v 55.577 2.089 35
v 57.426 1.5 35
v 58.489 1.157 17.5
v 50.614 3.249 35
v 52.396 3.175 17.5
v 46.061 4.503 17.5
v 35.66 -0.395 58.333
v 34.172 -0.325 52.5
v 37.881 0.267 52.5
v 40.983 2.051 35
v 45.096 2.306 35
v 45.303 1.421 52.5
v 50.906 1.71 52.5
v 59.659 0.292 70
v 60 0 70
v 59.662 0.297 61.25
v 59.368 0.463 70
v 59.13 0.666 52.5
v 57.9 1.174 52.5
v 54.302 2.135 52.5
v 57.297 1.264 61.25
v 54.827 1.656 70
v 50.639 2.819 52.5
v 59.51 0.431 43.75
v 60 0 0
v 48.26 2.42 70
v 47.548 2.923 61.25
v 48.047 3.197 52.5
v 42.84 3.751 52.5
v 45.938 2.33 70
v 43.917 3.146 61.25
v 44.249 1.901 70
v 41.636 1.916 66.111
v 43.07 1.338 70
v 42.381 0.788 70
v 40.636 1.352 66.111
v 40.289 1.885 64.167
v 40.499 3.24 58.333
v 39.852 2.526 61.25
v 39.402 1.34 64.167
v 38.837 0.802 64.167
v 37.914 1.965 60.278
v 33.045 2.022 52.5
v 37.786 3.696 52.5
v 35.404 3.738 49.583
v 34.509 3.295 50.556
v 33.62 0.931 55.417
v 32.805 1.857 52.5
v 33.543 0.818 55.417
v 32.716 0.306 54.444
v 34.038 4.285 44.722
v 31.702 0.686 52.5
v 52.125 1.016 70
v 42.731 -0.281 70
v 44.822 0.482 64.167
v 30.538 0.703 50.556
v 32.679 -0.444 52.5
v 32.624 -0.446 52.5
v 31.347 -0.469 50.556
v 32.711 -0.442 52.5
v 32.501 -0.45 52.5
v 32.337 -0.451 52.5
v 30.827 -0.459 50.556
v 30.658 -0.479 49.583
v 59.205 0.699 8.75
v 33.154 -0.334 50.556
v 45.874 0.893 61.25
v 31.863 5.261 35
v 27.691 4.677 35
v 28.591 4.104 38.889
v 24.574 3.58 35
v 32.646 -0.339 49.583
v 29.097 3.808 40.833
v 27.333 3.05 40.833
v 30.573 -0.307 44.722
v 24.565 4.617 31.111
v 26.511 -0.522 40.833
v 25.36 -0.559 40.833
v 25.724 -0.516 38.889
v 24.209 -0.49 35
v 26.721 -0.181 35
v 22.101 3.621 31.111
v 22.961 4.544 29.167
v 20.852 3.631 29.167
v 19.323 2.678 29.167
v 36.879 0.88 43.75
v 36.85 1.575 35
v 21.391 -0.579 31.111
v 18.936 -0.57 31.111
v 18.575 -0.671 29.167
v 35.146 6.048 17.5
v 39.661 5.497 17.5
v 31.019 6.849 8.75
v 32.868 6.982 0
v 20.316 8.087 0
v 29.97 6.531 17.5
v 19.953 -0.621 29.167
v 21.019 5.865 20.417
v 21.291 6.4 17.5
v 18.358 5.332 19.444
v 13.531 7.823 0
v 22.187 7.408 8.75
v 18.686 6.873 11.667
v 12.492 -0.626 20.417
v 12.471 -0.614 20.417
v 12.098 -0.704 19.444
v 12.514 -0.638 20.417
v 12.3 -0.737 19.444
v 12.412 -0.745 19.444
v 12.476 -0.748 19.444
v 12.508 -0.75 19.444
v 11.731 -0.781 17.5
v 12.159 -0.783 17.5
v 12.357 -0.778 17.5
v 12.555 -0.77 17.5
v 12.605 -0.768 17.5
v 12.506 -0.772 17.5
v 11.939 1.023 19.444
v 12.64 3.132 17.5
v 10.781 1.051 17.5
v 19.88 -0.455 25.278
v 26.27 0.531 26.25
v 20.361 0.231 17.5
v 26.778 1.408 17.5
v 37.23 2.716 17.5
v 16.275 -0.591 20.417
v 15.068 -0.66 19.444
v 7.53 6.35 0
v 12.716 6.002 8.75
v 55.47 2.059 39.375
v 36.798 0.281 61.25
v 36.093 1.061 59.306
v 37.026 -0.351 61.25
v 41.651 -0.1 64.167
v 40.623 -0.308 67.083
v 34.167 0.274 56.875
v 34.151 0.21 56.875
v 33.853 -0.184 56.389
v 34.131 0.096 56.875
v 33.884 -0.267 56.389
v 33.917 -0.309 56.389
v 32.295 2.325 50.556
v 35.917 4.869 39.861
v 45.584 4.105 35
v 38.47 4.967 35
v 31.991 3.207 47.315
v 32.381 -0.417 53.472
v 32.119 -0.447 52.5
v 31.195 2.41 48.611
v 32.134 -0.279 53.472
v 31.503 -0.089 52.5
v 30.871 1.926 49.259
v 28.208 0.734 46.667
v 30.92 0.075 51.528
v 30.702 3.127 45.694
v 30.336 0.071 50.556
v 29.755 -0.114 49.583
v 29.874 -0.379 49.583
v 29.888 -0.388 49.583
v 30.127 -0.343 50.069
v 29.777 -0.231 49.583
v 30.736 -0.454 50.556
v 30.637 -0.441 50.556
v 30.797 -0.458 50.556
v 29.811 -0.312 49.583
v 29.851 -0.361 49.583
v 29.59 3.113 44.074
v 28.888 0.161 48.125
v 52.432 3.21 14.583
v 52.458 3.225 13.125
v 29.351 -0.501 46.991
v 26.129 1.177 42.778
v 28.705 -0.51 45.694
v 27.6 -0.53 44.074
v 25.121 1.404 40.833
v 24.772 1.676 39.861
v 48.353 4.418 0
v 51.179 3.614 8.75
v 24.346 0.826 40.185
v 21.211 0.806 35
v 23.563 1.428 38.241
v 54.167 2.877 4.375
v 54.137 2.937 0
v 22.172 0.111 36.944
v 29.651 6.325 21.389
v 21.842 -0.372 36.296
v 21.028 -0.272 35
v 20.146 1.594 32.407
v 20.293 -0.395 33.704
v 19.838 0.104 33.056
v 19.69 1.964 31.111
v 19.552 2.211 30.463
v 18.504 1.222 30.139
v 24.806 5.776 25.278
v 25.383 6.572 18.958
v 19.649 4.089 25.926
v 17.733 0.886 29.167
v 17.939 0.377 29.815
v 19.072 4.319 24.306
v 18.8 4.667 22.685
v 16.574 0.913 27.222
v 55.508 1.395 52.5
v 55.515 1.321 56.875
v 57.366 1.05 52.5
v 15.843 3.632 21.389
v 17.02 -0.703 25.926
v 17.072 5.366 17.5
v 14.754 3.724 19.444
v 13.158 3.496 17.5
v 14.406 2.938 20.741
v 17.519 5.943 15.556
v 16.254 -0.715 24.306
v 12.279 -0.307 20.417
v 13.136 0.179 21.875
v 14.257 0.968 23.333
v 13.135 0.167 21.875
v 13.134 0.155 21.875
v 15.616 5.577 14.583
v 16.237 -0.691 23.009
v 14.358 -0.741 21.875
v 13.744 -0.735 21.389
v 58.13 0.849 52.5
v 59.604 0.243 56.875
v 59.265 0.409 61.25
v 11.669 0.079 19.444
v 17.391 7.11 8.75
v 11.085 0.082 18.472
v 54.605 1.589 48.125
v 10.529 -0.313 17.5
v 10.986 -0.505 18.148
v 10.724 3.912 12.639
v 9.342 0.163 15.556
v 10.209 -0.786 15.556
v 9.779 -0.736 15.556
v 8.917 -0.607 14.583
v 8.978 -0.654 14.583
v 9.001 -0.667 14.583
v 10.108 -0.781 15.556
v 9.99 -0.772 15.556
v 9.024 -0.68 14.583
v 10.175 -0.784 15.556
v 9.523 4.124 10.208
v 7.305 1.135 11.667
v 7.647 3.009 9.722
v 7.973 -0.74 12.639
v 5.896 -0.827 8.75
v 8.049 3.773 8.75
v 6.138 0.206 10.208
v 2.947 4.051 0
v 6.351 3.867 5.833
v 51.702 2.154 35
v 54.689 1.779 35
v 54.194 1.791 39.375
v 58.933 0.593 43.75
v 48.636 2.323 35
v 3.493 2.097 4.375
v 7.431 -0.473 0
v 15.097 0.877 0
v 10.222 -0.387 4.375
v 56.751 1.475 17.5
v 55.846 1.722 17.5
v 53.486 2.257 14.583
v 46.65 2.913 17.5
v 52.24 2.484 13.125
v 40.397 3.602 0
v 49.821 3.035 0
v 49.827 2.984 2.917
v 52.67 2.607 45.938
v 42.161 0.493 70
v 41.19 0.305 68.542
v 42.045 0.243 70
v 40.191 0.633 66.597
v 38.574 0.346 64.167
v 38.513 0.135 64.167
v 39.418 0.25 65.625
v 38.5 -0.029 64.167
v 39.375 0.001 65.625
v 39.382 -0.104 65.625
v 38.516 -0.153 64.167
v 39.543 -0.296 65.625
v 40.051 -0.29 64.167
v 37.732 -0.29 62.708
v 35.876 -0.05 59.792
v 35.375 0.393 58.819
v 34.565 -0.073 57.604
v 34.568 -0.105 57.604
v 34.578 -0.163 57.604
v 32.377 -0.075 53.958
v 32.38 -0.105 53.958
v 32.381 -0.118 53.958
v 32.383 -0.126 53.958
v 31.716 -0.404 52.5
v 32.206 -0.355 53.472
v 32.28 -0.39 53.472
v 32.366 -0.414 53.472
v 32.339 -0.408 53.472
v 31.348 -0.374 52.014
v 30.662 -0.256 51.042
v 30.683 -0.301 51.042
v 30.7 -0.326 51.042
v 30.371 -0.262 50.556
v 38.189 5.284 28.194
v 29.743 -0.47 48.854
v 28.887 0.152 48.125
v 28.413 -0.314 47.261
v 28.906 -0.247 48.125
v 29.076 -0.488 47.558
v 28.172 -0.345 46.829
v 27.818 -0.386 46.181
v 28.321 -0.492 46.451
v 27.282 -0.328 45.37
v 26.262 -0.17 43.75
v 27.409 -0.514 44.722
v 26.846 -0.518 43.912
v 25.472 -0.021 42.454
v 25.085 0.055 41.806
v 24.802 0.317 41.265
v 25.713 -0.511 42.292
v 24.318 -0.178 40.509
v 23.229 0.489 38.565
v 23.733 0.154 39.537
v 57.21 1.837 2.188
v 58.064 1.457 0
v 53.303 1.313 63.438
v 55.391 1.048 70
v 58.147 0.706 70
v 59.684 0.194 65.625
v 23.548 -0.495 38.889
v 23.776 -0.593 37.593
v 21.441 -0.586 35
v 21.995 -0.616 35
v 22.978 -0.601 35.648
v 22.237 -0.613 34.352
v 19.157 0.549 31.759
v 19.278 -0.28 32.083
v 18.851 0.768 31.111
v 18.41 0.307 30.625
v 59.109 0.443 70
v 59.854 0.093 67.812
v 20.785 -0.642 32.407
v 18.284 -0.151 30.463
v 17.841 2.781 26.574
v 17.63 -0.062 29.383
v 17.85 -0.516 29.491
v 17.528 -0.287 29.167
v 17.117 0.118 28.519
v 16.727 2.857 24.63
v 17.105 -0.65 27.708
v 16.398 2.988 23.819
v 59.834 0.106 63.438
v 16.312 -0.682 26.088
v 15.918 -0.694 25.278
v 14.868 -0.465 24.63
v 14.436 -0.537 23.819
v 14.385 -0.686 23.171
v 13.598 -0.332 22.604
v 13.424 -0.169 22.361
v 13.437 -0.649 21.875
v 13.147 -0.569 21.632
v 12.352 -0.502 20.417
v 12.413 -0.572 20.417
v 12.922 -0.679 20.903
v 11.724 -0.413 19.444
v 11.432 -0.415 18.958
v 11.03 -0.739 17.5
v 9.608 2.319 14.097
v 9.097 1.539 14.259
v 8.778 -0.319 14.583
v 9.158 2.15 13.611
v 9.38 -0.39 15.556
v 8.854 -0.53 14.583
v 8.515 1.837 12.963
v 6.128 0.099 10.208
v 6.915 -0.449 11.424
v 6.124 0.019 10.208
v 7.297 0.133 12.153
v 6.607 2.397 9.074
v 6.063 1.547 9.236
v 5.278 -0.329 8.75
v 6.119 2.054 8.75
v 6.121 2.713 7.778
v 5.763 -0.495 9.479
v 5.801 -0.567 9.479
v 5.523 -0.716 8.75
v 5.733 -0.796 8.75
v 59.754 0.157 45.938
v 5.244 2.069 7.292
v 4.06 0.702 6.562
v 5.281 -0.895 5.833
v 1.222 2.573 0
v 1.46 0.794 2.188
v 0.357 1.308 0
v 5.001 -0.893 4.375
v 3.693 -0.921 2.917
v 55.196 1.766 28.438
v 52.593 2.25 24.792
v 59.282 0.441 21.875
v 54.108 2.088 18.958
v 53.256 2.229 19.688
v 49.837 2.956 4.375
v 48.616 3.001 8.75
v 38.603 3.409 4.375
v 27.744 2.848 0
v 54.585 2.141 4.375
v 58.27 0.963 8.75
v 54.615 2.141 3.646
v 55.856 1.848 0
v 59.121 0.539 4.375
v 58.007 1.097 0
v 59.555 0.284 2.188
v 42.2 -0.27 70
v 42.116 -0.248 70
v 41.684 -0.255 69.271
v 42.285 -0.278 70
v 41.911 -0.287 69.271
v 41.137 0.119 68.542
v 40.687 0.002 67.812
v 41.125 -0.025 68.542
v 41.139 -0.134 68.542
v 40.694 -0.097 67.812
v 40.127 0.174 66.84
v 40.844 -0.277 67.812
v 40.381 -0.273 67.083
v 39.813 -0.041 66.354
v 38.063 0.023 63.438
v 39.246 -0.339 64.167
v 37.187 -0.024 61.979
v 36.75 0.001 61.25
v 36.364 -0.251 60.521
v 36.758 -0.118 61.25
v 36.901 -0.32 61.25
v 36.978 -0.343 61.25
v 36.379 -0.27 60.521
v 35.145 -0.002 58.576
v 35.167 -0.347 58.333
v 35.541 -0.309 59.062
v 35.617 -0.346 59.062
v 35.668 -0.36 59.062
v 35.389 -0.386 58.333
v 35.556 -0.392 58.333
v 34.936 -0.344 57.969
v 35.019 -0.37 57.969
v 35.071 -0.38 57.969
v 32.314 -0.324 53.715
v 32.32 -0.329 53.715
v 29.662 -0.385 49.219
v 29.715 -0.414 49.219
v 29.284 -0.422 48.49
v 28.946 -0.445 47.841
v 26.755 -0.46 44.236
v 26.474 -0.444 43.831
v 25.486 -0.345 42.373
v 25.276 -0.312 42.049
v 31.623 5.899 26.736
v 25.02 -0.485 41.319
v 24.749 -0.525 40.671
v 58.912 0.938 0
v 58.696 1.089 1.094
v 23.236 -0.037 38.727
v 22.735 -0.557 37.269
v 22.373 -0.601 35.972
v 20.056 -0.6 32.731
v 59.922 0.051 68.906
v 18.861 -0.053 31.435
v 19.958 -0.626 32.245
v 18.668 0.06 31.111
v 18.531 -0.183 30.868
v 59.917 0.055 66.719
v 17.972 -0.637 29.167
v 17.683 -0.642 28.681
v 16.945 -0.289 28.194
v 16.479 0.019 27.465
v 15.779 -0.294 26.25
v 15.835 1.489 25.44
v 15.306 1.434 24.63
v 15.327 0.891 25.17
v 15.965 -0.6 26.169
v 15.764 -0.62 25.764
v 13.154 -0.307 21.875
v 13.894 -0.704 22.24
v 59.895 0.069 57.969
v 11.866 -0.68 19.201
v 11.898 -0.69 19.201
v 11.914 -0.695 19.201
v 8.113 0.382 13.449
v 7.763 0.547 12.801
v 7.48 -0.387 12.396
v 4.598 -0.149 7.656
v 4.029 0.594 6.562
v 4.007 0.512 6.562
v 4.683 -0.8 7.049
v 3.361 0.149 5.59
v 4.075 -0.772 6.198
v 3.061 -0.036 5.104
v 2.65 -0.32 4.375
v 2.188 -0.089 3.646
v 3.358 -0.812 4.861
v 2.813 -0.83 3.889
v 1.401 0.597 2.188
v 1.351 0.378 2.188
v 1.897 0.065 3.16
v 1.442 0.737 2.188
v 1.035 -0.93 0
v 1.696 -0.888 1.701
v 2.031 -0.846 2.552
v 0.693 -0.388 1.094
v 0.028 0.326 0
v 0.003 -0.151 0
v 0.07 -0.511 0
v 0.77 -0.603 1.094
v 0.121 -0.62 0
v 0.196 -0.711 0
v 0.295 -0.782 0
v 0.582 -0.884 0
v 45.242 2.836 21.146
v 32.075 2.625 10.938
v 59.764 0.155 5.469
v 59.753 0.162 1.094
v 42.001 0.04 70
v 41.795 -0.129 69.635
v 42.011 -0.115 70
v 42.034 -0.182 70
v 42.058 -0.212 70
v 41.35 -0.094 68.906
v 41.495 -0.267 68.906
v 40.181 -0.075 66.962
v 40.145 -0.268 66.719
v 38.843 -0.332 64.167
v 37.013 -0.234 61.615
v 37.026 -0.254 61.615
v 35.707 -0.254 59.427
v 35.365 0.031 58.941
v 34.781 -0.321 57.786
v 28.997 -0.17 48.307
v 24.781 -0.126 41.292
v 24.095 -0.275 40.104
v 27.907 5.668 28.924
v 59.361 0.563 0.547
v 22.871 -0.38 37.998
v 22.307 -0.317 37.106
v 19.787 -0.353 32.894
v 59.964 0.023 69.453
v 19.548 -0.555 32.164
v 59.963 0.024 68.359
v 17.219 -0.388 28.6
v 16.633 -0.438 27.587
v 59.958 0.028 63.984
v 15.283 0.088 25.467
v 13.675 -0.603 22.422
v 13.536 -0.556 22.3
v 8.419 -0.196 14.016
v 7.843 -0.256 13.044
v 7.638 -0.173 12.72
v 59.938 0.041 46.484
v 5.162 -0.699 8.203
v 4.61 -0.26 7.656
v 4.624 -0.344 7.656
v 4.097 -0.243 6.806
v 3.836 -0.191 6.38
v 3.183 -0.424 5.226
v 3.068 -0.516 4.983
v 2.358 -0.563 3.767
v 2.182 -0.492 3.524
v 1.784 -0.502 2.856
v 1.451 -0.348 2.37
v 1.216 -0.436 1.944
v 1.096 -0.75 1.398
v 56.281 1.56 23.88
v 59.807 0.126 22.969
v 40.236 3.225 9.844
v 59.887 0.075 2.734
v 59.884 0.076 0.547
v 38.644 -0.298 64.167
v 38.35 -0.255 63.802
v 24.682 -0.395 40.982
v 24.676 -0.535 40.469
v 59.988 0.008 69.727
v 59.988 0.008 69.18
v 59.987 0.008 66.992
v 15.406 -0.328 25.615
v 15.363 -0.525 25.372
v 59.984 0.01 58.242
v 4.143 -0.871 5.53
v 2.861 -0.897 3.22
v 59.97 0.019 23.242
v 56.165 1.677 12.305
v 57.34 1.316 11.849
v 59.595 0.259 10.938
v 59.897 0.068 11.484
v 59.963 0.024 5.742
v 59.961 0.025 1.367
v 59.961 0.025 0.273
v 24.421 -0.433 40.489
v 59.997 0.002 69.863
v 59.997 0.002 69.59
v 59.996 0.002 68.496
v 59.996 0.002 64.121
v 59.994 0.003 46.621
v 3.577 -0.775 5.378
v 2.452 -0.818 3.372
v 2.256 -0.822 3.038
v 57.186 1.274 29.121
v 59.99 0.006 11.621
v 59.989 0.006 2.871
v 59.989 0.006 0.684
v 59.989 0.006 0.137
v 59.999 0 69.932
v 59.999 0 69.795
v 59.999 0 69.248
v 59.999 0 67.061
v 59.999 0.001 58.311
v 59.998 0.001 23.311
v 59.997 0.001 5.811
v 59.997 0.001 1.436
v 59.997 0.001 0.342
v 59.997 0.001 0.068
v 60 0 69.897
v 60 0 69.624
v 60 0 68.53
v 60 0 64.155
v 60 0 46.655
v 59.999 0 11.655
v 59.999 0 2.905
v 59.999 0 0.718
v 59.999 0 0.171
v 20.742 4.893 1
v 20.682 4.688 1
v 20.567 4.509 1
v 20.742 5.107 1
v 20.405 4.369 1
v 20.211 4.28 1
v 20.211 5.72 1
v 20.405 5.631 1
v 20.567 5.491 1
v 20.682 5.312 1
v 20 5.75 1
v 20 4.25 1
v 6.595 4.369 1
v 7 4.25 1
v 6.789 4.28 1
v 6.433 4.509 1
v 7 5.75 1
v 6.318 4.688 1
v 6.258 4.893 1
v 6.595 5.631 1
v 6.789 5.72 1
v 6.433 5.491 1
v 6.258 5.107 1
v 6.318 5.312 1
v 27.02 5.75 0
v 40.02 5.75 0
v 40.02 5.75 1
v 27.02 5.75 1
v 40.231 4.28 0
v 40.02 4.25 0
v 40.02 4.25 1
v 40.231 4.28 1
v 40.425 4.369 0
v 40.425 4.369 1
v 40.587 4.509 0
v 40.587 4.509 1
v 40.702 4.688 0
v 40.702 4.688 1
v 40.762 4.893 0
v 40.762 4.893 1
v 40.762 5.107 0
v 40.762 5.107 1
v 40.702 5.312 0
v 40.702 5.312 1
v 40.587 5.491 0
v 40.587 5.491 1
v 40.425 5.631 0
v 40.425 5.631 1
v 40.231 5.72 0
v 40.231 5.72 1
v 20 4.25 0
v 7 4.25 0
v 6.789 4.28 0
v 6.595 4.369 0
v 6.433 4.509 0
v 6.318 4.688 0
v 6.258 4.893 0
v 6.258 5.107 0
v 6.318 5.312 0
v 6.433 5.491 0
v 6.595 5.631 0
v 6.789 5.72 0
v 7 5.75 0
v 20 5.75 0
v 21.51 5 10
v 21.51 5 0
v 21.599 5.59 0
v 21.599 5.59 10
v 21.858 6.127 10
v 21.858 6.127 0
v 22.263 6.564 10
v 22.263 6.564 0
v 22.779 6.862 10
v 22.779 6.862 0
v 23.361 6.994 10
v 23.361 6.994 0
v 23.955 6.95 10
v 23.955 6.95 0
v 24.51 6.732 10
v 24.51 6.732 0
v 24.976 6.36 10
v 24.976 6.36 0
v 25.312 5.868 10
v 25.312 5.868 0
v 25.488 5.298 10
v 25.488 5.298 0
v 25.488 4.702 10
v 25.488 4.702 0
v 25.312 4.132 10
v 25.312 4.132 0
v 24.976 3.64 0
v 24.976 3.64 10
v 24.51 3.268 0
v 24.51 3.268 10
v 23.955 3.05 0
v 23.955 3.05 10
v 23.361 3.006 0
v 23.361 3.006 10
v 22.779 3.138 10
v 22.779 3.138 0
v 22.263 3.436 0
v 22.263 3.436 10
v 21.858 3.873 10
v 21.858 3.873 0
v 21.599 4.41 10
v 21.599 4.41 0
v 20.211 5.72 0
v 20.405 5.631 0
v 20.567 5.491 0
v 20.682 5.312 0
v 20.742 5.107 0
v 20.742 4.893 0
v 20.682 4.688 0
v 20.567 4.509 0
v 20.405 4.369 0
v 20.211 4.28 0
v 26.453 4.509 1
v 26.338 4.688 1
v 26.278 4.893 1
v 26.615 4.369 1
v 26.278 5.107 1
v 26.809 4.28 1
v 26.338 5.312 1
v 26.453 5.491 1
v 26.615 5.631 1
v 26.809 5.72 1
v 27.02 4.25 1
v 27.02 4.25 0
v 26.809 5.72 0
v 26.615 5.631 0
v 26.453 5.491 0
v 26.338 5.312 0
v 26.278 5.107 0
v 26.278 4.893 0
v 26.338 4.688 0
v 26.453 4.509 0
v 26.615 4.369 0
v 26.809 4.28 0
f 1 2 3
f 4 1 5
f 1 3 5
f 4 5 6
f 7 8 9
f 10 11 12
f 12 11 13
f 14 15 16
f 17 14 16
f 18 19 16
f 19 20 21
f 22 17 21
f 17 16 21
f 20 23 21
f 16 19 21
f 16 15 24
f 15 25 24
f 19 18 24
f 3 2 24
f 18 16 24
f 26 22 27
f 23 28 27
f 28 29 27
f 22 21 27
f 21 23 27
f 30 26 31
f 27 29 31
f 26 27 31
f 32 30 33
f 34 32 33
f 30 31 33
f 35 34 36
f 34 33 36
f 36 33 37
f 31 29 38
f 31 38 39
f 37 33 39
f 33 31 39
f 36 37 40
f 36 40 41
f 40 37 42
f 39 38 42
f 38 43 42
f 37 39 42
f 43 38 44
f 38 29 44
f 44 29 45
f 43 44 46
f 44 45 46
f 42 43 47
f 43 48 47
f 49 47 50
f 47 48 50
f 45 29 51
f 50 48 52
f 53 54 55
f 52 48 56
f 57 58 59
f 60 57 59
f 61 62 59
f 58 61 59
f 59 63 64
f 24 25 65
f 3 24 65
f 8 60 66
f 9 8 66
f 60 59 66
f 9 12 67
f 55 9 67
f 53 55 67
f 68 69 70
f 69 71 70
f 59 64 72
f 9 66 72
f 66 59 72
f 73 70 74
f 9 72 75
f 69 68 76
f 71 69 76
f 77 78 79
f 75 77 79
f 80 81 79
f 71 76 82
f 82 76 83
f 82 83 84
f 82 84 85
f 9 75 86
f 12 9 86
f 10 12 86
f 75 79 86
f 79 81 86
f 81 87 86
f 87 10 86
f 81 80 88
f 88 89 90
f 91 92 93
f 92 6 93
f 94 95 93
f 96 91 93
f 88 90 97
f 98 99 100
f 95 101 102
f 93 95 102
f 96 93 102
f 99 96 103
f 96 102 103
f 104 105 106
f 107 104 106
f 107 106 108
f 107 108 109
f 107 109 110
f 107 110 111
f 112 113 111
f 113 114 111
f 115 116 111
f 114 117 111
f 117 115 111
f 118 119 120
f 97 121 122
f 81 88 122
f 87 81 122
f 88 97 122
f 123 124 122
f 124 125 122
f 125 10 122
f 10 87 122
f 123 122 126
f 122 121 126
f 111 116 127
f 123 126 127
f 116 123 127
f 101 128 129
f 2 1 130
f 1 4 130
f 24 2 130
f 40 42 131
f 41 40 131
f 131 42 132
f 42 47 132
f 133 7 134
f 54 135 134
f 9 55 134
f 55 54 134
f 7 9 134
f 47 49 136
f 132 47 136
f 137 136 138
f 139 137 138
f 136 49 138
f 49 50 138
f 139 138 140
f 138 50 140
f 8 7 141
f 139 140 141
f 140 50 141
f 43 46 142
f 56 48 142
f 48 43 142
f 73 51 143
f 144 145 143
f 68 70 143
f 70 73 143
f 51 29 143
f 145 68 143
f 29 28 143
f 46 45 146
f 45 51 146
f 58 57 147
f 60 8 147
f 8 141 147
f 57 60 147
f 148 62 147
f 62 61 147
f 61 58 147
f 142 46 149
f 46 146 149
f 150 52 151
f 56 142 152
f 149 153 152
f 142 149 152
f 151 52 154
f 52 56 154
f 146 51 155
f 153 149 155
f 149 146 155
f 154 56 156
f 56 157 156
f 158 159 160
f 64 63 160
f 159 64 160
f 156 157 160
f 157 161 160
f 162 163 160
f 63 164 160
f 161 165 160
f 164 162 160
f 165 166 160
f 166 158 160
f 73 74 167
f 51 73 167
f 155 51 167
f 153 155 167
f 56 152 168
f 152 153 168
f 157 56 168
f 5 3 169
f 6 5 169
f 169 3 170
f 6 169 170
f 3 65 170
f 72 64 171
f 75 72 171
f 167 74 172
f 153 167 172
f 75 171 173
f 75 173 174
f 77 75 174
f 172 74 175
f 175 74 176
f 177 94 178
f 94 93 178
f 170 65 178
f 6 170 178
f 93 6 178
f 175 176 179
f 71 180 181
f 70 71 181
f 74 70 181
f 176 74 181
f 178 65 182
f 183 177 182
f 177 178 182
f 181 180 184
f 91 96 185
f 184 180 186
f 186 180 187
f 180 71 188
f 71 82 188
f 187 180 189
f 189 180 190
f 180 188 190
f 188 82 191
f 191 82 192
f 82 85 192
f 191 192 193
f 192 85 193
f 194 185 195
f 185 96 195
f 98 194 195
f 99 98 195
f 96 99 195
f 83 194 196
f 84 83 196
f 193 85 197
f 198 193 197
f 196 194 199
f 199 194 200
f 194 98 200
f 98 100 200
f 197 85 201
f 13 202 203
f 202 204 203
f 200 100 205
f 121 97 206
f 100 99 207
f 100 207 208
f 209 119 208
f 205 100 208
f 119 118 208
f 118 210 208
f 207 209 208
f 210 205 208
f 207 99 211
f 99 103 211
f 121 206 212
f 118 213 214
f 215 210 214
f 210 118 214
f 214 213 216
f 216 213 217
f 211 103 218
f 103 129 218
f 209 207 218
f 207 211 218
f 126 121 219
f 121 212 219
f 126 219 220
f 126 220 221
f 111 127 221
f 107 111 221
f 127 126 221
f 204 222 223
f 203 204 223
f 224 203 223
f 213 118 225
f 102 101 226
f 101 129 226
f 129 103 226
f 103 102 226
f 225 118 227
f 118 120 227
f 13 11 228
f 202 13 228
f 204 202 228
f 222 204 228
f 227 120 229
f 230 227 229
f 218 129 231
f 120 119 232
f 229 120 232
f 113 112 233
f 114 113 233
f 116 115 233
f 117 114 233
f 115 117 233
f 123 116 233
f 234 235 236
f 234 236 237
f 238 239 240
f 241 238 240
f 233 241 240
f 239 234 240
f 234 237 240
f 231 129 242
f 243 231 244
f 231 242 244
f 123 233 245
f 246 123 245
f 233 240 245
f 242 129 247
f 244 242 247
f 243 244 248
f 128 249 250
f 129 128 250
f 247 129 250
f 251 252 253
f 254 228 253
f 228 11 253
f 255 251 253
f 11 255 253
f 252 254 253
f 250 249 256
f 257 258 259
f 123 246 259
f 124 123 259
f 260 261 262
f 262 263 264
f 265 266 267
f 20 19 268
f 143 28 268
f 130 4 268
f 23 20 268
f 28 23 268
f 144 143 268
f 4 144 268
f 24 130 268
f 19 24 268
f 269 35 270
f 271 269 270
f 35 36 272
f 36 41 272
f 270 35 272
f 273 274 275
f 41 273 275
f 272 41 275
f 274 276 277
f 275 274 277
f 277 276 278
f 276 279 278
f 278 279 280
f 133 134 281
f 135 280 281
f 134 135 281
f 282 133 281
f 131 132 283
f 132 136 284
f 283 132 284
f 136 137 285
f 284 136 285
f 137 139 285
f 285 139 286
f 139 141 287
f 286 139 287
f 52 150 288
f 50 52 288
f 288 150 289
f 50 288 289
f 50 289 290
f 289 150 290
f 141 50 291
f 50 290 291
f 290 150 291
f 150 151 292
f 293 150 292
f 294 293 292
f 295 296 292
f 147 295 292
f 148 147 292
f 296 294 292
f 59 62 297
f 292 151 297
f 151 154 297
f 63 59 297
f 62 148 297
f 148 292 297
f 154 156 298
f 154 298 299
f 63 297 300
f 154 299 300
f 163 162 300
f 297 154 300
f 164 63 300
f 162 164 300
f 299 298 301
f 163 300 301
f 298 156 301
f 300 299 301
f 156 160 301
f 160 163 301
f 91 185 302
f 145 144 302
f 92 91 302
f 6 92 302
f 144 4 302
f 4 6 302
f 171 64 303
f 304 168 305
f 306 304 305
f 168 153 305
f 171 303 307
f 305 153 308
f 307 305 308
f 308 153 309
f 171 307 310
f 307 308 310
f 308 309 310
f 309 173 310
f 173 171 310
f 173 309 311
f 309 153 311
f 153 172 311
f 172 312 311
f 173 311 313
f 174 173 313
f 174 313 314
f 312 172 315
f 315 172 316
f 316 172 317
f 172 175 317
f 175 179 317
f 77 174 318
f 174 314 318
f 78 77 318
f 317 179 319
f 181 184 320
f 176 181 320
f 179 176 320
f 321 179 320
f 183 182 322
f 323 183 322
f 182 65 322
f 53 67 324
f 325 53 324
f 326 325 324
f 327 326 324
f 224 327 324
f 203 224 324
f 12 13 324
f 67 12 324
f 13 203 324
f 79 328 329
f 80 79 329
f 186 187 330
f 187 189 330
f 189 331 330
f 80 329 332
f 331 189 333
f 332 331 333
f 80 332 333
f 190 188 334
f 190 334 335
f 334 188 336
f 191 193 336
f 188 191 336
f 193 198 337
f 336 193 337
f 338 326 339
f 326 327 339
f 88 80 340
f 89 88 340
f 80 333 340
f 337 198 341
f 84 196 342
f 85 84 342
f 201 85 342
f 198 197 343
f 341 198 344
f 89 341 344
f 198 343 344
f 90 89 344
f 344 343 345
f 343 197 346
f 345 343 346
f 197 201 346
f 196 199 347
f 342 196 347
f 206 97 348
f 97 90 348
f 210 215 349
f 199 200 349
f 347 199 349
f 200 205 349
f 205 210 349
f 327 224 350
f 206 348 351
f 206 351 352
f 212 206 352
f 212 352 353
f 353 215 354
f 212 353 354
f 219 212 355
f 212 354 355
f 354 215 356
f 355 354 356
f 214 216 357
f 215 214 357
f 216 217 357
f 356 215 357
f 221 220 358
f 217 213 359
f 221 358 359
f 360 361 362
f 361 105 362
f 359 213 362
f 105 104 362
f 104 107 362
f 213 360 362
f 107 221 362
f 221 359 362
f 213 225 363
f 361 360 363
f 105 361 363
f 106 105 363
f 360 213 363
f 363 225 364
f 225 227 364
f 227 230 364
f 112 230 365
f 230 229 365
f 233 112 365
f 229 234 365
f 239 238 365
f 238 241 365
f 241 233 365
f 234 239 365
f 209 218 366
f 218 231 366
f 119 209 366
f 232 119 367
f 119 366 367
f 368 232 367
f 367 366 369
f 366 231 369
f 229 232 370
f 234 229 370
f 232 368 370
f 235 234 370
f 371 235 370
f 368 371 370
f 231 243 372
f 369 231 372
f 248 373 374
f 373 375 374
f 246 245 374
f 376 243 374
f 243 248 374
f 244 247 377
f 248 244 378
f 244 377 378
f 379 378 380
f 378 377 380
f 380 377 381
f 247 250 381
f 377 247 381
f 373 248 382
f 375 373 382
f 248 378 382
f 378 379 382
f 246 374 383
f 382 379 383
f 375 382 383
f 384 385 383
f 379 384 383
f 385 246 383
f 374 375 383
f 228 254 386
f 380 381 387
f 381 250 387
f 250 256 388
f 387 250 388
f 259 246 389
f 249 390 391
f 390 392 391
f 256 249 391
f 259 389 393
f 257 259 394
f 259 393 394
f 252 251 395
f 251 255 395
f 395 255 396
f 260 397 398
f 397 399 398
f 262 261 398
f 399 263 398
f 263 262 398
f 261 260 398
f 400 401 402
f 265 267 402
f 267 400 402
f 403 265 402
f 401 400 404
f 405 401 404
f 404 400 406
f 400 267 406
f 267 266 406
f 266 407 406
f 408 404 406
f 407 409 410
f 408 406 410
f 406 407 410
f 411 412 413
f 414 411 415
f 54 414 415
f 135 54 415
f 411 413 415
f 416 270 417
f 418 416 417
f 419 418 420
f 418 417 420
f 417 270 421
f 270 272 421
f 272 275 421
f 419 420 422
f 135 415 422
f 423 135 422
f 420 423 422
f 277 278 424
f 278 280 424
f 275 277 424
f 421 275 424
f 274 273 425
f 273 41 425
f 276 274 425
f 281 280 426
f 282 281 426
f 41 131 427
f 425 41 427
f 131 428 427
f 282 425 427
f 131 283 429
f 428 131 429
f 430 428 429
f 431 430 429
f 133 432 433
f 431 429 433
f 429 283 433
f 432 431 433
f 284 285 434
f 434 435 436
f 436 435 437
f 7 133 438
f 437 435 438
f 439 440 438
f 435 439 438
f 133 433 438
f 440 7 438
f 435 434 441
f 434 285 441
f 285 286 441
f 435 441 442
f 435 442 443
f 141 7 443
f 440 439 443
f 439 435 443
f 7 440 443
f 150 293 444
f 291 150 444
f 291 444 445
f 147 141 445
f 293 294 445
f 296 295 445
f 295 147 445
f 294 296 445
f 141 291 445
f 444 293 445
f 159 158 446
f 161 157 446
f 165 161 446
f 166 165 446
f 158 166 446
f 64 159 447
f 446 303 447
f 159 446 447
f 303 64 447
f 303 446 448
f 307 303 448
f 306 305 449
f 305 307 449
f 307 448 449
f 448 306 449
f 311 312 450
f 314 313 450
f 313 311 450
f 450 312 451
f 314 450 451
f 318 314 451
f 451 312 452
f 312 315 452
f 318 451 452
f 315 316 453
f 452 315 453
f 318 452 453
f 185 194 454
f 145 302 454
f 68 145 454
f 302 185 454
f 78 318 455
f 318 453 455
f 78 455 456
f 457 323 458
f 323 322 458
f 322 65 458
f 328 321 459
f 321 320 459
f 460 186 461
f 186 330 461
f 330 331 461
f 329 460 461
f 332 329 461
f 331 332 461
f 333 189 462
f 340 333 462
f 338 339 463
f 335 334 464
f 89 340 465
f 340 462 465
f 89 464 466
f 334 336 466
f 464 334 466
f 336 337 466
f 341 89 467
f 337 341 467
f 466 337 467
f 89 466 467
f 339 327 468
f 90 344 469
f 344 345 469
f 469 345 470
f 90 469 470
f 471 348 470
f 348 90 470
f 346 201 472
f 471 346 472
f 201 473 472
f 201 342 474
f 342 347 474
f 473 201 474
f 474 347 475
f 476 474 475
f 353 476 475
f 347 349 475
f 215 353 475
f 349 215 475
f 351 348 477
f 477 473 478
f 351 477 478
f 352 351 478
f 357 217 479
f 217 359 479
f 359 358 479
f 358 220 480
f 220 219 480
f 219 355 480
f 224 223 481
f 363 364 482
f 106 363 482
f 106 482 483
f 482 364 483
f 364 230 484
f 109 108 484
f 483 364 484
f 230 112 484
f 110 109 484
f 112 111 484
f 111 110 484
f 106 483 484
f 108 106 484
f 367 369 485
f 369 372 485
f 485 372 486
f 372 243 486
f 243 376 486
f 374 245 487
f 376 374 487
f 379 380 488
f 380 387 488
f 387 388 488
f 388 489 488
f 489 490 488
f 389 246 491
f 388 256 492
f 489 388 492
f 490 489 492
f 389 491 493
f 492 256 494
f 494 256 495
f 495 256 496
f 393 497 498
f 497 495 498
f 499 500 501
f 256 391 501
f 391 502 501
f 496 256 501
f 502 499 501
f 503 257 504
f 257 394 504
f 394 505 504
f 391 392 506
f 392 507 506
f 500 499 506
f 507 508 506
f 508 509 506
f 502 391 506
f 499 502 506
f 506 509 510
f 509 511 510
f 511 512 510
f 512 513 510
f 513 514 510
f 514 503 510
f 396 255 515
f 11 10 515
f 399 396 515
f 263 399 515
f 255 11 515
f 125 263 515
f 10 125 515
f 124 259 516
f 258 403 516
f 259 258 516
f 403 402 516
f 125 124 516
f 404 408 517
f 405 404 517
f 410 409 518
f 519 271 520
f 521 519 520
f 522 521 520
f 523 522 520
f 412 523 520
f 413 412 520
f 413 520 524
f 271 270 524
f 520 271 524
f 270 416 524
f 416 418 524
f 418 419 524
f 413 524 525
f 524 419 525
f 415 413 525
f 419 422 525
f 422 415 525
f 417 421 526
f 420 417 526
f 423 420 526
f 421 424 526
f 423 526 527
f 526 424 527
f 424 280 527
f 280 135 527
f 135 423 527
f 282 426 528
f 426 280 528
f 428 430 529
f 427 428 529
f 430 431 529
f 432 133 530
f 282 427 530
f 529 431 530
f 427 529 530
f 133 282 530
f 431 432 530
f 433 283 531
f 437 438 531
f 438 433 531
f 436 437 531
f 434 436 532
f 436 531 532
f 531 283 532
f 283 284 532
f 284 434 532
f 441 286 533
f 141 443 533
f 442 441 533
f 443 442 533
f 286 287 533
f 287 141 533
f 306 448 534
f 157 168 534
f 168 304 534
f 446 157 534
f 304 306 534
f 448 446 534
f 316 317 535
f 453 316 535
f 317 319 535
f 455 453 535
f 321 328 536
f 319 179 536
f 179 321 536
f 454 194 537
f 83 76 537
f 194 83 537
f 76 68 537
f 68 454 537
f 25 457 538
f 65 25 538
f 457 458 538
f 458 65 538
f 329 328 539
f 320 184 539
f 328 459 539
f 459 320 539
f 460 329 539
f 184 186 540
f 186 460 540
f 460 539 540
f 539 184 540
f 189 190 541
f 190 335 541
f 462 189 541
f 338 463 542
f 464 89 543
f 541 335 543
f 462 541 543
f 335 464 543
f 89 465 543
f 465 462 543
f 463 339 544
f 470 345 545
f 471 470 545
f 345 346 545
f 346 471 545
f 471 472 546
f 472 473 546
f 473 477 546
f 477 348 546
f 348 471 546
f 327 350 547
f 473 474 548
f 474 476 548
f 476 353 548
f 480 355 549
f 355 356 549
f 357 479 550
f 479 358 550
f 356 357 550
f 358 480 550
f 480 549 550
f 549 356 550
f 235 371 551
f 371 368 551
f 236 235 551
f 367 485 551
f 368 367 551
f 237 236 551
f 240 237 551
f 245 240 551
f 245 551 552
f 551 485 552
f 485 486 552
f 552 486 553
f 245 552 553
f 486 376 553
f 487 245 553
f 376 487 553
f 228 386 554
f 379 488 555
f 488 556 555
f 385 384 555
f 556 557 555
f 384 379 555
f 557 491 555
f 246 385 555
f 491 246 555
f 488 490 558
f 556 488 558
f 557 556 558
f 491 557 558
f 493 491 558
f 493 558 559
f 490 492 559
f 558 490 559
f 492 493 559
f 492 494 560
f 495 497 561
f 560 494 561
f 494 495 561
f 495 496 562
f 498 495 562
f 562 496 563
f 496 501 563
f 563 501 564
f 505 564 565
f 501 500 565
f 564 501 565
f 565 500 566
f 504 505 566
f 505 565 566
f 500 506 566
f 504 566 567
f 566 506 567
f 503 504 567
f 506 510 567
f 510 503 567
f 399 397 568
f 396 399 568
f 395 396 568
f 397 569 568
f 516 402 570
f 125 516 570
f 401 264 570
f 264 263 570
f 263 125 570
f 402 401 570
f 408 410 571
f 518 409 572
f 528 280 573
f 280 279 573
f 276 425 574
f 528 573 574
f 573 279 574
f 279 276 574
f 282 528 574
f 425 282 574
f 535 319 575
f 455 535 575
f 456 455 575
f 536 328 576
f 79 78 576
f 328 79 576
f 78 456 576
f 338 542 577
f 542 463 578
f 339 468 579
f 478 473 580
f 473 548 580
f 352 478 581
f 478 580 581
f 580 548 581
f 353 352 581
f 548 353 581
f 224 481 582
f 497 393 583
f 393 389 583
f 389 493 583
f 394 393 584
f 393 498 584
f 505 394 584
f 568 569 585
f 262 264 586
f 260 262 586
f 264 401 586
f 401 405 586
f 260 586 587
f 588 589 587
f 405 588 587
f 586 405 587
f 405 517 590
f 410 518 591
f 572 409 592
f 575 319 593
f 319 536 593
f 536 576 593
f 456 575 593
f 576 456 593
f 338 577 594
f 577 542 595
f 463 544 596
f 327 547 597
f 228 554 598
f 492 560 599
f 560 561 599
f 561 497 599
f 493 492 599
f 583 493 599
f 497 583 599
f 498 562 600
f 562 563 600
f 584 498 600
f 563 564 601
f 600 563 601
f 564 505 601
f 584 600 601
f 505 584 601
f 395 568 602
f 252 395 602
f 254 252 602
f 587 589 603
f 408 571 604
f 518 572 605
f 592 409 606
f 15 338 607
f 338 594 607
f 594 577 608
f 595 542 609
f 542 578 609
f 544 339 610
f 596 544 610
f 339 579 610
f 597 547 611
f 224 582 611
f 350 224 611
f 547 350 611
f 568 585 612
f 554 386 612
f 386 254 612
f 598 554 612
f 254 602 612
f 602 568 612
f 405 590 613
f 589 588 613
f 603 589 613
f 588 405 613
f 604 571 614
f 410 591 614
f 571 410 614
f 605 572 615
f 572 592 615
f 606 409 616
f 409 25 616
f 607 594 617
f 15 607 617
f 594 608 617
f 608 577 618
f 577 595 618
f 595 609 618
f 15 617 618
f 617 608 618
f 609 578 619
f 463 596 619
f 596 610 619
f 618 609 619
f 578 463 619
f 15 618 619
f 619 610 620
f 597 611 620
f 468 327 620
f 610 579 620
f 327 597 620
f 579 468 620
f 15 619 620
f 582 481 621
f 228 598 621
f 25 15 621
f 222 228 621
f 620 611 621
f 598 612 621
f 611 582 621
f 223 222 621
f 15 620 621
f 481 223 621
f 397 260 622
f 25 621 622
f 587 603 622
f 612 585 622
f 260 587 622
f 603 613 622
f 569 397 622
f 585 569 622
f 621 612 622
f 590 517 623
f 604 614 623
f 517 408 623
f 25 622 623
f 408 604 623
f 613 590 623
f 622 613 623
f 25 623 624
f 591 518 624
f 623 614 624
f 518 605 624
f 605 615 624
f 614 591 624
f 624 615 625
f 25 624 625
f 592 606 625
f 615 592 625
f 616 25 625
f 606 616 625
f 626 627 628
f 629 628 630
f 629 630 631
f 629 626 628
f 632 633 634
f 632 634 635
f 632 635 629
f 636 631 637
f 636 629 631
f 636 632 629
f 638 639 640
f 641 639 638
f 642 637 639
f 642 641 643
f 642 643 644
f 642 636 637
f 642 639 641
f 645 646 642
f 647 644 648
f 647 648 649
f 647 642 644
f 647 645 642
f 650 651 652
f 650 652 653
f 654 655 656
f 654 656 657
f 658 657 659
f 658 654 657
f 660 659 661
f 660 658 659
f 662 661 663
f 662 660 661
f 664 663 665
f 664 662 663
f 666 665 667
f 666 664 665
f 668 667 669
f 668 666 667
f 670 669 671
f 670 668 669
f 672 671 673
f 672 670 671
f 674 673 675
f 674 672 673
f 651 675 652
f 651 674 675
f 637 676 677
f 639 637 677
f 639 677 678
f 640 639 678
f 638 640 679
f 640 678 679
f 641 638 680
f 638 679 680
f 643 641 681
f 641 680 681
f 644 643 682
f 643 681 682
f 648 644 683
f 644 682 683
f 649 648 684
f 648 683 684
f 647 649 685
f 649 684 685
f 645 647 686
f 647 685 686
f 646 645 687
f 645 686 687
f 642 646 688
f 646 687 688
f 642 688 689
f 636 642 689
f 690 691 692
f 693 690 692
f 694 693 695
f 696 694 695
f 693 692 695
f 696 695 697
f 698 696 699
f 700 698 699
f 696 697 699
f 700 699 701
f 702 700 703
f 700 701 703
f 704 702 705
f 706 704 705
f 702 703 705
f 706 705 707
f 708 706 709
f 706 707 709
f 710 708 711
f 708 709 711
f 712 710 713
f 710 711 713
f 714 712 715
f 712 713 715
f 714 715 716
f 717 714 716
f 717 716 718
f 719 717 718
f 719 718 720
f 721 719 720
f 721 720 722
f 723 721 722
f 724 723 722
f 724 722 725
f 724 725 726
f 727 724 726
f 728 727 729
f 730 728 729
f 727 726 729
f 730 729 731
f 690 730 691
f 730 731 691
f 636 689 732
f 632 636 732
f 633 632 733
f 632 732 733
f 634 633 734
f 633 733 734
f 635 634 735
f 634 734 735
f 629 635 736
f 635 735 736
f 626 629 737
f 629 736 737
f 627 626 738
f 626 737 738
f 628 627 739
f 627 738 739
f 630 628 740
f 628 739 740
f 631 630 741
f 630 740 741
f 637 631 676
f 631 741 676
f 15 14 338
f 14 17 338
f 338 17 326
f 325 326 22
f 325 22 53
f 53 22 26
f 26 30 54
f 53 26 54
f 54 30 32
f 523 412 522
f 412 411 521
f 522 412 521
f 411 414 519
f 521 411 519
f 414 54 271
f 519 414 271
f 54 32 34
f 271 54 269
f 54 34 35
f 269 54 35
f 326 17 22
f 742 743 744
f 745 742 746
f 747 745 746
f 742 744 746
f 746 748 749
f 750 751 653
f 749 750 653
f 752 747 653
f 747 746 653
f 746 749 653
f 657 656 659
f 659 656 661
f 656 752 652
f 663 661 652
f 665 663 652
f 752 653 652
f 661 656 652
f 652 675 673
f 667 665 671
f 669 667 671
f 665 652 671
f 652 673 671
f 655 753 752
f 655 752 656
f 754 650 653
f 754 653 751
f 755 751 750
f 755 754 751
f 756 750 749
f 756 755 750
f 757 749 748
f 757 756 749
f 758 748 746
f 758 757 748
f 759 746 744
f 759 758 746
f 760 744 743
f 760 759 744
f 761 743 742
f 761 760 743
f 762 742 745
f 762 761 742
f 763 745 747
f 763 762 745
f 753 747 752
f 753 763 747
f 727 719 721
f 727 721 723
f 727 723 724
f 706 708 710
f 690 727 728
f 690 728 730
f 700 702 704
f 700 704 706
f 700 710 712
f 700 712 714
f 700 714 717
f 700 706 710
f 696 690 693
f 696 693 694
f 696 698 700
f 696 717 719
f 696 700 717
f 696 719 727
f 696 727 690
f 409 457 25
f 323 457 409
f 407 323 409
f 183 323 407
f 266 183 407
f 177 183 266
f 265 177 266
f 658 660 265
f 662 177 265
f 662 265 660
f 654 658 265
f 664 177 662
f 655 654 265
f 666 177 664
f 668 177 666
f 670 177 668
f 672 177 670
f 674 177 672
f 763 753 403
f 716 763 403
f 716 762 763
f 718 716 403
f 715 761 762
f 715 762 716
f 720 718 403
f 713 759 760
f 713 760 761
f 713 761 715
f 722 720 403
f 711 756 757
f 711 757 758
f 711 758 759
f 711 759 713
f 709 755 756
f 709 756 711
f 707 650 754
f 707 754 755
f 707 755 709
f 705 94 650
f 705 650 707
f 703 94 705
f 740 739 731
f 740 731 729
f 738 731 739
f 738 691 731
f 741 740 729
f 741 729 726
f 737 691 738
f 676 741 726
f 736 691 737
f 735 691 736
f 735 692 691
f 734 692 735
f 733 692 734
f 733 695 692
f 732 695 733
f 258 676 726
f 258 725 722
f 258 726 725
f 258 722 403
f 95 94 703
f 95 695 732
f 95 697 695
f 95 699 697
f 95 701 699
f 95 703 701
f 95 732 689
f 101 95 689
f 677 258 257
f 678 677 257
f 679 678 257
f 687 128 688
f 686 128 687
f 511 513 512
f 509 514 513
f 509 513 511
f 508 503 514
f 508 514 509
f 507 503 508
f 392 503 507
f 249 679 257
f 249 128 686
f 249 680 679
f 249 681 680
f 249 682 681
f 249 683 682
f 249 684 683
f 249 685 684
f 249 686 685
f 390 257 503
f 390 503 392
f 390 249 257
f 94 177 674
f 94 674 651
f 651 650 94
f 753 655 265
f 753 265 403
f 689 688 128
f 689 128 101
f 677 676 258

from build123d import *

# Parameters (mm, degrees)
SKETCH4_R          = 2
CUT_EXTRUDE1_DEPTH = 10
CUT_EXTRUDE2_DEPTH = 1


with BuildPart() as part:
    # Sketch3 → Loft1 section 0
    with BuildSketch(Plane.XY.offset(70)):
        with BuildLine():
            add(Edge.make_bspline(
                [(60, 0), (60.000107759, 0.00045823), (59.940935145, 0.044545857), (59.890891538, 0.093647308), (59.779774511, 0.196205337), (59.648682422, 0.305307561), (59.469359582, 0.415294301), (59.246370858, 0.521886024), (58.977168165, 0.633116991), (58.662177205, 0.747496515), (58.302798195, 0.863953961), (57.901335106, 0.982592376), (57.458471962, 1.097979924), (56.979558848, 1.219684363), (56.464360521, 1.335758178), (55.917664884, 1.451163432), (55.342255391, 1.563645721), (54.741619221, 1.672310848), (54.119503088, 1.776862794), (53.479502393, 1.875995081), (52.825753205, 1.969890082), (52.162446062, 2.057806833), (51.494385085, 2.13946315), (50.826910973, 2.215437436), (50.165549402, 2.283812601), (49.515688388, 2.343308945), (48.88189852, 2.390577682), (48.267800241, 2.423092507), (47.676809978, 2.437133923), (47.111955291, 2.435639306), (46.574289852, 2.407982369), (46.063605386, 2.351936832), (45.577823009, 2.272687612), (45.116825477, 2.170020947), (44.681086398, 2.04962996), (44.272449438, 1.913646961), (43.892652493, 1.765251918), (43.544055665, 1.605239875), (43.227776887, 1.436859538), (42.94553682, 1.262025717), (42.699105421, 1.083107561), (42.488584367, 0.903897458), (42.317026583, 0.722439194), (42.185248322, 0.540304202), (42.08790704, 0.363111111), (42.025521579, 0.194874666), (41.995794905, 0.039592478), (42.001532957, -0.091739447), (42.035344873, -0.212191985), (42.16102918, -0.271985507), (42.33001338, -0.28037435), (42.561183137, -0.288504849), (42.85189542, -0.275968725), (43.198864607, -0.252931149), (43.598229294, -0.216029949), (44.045902873, -0.166101037), (44.539702369, -0.102073031), (45.07938647, -0.012584366), (45.667582852, 0.09963297), (46.307232102, 0.221761241), (46.995207664, 0.350711186), (47.72718833, 0.481130505), (48.497798407, 0.608124713), (49.301059449, 0.727453141), (50.130048988, 0.834738394), (50.977312155, 0.926856584), (51.834845451, 0.99967222), (52.694043317, 1.051289527), (53.545929342, 1.07966642), (54.381262057, 1.083250625), (55.190722018, 1.061798612), (55.965040428, 1.015812577), (56.694906217, 0.945885863), (57.371629898, 0.8547026), (57.986400744, 0.744908581), (58.532010839, 0.620180946), (58.99840484, 0.486716819), (59.380100231, 0.344272382), (59.652430067, 0.213917485), (59.853211585, 0.093386968), (59.93034321, 0.046743647), (59.99989005, -0.000467545), (60, 0)],
                knots=[0, 0, 0, 0, 0.000979678, 0.003648865, 0.007483504, 0.012095286, 0.017525603, 0.024051797, 0.031783073, 0.040677857, 0.050710337, 0.061833274, 0.073978206, 0.087117514, 0.1011444, 0.115989999, 0.131569795, 0.147787764, 0.164550314, 0.181757305, 0.199311377, 0.217094507, 0.234989676, 0.252856344, 0.270540067, 0.287886265, 0.304772936, 0.321100929, 0.336805584, 0.351799565, 0.366030606, 0.379615227, 0.392652524, 0.405169929, 0.417171498, 0.428603104, 0.439418554, 0.449596189, 0.459101689, 0.467907493, 0.475987922, 0.483308596, 0.48987414, 0.495802886, 0.501149052, 0.505902717, 0.510046415, 0.51357896, 0.516446578, 0.519349706, 0.523823011, 0.529973455, 0.537715321, 0.546967517, 0.557637048, 0.56962017, 0.582803823, 0.59724667, 0.613134757, 0.630443334, 0.64905587, 0.668822018, 0.68959474, 0.711189442, 0.733426497, 0.756093941, 0.778988394, 0.80188954, 0.824566471, 0.846792174, 0.868338195, 0.888978083, 0.908491945, 0.926658715, 0.943286152, 0.95816918, 0.971135801, 0.98195561, 0.990251784, 0.995852562, 0.999000405, 1, 1, 1, 1], degree=3))
        make_face()
    # Sketch2 → Loft1 section 1
    with BuildSketch(Plane.XY):
        with BuildLine():
            add(Edge.make_bspline(
                [(60, 0), (60.000359197, 0.001527432), (59.80311715, 0.148486191), (59.636305128, 0.312157693), (59.265915035, 0.654017791), (58.828941408, 1.01769187), (58.231198607, 1.384314338), (57.487902859, 1.739620081), (56.590560551, 2.110389969), (55.540590684, 2.491655052), (54.342660651, 2.879846537), (53.004450354, 3.275307919), (51.528239873, 3.659933081), (49.931862826, 4.065614543), (48.21453507, 4.45252726), (46.392216281, 4.837211439), (44.474184637, 5.212152404), (42.47206407, 5.574369492), (40.398343628, 5.92287598), (38.265007978, 6.253316937), (36.085844017, 6.566300275), (33.874820207, 6.859356111), (31.647950283, 7.131543832), (29.423036576, 7.384791452), (27.218498007, 7.612708672), (25.052294626, 7.811029816), (22.939661735, 7.968592274), (20.892667469, 8.076975023), (18.922699926, 8.123779744), (17.039850969, 8.118797688), (15.247632842, 8.026607898), (13.545351286, 7.839789441), (11.926076695, 7.575625373), (10.389418256, 7.233403155), (8.93695466, 6.832099867), (7.574831461, 6.378823205), (6.308841643, 5.884173059), (5.146852216, 5.350799583), (4.092589623, 4.789531794), (3.151789401, 4.20675239), (2.330351404, 3.610358538), (1.628614556, 3.012991527), (1.056755276, 2.408130647), (0.617494407, 1.801014007), (0.293023466, 1.210370369), (0.085071932, 0.649582219), (-0.014016985, 0.131974926), (0.005109858, -0.305798158), (0.117816245, -0.707306616), (0.536763933, -0.906618356), (1.100044602, -0.934581165), (1.870610456, -0.96168283), (2.8396514, -0.91989575), (3.996215358, -0.843103831), (5.32743098, -0.720099828), (6.819676242, -0.553670124), (8.465674563, -0.340243438), (10.264621567, -0.041947886), (12.225276175, 0.332109901), (14.357440339, 0.739204138), (16.650692214, 1.169037288), (19.090627767, 1.60376835), (21.659328024, 2.027082377), (24.336864829, 2.424843805), (27.100163295, 2.782461315), (29.924373851, 3.089521947), (32.78281817, 3.332240734), (35.646811058, 3.504298425), (38.486431141, 3.598888068), (41.270873525, 3.610835418), (43.969073393, 3.539328707), (46.550134759, 3.386041923), (48.983020725, 3.152952876), (51.238766327, 2.849008665), (53.28800248, 2.483028604), (55.106702797, 2.06726982), (56.661349467, 1.622389398), (57.933667436, 1.147574605), (58.841433556, 0.713058282), (59.510705283, 0.311289894), (59.767810701, 0.155812155), (59.999633501, -0.001558484), (60, 0)],
                knots=[0, 0, 0, 0, 0.000979678, 0.003648865, 0.007483504, 0.012095286, 0.017525603, 0.024051797, 0.031783073, 0.040677857, 0.050710337, 0.061833274, 0.073978206, 0.087117514, 0.1011444, 0.115989999, 0.131569795, 0.147787764, 0.164550314, 0.181757305, 0.199311377, 0.217094507, 0.234989676, 0.252856344, 0.270540067, 0.287886265, 0.304772936, 0.321100929, 0.336805584, 0.351799565, 0.366030606, 0.379615227, 0.392652524, 0.405169929, 0.417171498, 0.428603104, 0.439418554, 0.449596189, 0.459101689, 0.467907493, 0.475987922, 0.483308596, 0.48987414, 0.495802886, 0.501149052, 0.505902717, 0.510046415, 0.51357896, 0.516446578, 0.519349706, 0.523823011, 0.529973455, 0.537715321, 0.546967517, 0.557637048, 0.56962017, 0.582803823, 0.59724667, 0.613134757, 0.630443334, 0.64905587, 0.668822018, 0.68959474, 0.711189442, 0.733426497, 0.756093941, 0.778988394, 0.80188954, 0.824566471, 0.846792174, 0.868338195, 0.888978083, 0.908491945, 0.926658715, 0.943286152, 0.95816918, 0.971135801, 0.98195561, 0.990251784, 0.995852562, 0.999000405, 1, 1, 1, 1], degree=3))
        make_face()
    loft()

    # Sketch4 → Cut-Extrude1 (cut)
    with BuildSketch(Plane(origin=(0, 0, 0), x_dir=(-1, 0, 0), z_dir=(0, 0, -1))):
        with Locations((-23.51, 5)):
            Circle(SKETCH4_R)
    extrude(amount=-CUT_EXTRUDE1_DEPTH, mode=Mode.SUBTRACT)

    # Sketch4<3> → Cut-Extrude2 (cut)
    with BuildSketch(Plane(origin=(0, 0, 0), x_dir=(-1, 0, 0), z_dir=(0, 0, -1))):
        with BuildLine():
            Line((-40.02, 5.75), (-27.02, 5.75))
            ThreePointArc((-27.02, 5.75), (-26.27, 5), (-27.02, 4.25))
            Line((-27.02, 4.25), (-40.02, 4.25))
            ThreePointArc((-40.02, 4.25), (-40.77, 5), (-40.02, 5.75))
        make_face()
        with BuildLine():
            Line((-7, 5.75), (-20, 5.75))
            ThreePointArc((-20, 5.75), (-20.75, 5), (-20, 4.25))
            Line((-20, 4.25), (-7, 4.25))
            ThreePointArc((-7, 4.25), (-6.25, 5), (-7, 5.75))
        make_face()
    extrude(amount=-CUT_EXTRUDE2_DEPTH, mode=Mode.SUBTRACT)


solid = part.part
